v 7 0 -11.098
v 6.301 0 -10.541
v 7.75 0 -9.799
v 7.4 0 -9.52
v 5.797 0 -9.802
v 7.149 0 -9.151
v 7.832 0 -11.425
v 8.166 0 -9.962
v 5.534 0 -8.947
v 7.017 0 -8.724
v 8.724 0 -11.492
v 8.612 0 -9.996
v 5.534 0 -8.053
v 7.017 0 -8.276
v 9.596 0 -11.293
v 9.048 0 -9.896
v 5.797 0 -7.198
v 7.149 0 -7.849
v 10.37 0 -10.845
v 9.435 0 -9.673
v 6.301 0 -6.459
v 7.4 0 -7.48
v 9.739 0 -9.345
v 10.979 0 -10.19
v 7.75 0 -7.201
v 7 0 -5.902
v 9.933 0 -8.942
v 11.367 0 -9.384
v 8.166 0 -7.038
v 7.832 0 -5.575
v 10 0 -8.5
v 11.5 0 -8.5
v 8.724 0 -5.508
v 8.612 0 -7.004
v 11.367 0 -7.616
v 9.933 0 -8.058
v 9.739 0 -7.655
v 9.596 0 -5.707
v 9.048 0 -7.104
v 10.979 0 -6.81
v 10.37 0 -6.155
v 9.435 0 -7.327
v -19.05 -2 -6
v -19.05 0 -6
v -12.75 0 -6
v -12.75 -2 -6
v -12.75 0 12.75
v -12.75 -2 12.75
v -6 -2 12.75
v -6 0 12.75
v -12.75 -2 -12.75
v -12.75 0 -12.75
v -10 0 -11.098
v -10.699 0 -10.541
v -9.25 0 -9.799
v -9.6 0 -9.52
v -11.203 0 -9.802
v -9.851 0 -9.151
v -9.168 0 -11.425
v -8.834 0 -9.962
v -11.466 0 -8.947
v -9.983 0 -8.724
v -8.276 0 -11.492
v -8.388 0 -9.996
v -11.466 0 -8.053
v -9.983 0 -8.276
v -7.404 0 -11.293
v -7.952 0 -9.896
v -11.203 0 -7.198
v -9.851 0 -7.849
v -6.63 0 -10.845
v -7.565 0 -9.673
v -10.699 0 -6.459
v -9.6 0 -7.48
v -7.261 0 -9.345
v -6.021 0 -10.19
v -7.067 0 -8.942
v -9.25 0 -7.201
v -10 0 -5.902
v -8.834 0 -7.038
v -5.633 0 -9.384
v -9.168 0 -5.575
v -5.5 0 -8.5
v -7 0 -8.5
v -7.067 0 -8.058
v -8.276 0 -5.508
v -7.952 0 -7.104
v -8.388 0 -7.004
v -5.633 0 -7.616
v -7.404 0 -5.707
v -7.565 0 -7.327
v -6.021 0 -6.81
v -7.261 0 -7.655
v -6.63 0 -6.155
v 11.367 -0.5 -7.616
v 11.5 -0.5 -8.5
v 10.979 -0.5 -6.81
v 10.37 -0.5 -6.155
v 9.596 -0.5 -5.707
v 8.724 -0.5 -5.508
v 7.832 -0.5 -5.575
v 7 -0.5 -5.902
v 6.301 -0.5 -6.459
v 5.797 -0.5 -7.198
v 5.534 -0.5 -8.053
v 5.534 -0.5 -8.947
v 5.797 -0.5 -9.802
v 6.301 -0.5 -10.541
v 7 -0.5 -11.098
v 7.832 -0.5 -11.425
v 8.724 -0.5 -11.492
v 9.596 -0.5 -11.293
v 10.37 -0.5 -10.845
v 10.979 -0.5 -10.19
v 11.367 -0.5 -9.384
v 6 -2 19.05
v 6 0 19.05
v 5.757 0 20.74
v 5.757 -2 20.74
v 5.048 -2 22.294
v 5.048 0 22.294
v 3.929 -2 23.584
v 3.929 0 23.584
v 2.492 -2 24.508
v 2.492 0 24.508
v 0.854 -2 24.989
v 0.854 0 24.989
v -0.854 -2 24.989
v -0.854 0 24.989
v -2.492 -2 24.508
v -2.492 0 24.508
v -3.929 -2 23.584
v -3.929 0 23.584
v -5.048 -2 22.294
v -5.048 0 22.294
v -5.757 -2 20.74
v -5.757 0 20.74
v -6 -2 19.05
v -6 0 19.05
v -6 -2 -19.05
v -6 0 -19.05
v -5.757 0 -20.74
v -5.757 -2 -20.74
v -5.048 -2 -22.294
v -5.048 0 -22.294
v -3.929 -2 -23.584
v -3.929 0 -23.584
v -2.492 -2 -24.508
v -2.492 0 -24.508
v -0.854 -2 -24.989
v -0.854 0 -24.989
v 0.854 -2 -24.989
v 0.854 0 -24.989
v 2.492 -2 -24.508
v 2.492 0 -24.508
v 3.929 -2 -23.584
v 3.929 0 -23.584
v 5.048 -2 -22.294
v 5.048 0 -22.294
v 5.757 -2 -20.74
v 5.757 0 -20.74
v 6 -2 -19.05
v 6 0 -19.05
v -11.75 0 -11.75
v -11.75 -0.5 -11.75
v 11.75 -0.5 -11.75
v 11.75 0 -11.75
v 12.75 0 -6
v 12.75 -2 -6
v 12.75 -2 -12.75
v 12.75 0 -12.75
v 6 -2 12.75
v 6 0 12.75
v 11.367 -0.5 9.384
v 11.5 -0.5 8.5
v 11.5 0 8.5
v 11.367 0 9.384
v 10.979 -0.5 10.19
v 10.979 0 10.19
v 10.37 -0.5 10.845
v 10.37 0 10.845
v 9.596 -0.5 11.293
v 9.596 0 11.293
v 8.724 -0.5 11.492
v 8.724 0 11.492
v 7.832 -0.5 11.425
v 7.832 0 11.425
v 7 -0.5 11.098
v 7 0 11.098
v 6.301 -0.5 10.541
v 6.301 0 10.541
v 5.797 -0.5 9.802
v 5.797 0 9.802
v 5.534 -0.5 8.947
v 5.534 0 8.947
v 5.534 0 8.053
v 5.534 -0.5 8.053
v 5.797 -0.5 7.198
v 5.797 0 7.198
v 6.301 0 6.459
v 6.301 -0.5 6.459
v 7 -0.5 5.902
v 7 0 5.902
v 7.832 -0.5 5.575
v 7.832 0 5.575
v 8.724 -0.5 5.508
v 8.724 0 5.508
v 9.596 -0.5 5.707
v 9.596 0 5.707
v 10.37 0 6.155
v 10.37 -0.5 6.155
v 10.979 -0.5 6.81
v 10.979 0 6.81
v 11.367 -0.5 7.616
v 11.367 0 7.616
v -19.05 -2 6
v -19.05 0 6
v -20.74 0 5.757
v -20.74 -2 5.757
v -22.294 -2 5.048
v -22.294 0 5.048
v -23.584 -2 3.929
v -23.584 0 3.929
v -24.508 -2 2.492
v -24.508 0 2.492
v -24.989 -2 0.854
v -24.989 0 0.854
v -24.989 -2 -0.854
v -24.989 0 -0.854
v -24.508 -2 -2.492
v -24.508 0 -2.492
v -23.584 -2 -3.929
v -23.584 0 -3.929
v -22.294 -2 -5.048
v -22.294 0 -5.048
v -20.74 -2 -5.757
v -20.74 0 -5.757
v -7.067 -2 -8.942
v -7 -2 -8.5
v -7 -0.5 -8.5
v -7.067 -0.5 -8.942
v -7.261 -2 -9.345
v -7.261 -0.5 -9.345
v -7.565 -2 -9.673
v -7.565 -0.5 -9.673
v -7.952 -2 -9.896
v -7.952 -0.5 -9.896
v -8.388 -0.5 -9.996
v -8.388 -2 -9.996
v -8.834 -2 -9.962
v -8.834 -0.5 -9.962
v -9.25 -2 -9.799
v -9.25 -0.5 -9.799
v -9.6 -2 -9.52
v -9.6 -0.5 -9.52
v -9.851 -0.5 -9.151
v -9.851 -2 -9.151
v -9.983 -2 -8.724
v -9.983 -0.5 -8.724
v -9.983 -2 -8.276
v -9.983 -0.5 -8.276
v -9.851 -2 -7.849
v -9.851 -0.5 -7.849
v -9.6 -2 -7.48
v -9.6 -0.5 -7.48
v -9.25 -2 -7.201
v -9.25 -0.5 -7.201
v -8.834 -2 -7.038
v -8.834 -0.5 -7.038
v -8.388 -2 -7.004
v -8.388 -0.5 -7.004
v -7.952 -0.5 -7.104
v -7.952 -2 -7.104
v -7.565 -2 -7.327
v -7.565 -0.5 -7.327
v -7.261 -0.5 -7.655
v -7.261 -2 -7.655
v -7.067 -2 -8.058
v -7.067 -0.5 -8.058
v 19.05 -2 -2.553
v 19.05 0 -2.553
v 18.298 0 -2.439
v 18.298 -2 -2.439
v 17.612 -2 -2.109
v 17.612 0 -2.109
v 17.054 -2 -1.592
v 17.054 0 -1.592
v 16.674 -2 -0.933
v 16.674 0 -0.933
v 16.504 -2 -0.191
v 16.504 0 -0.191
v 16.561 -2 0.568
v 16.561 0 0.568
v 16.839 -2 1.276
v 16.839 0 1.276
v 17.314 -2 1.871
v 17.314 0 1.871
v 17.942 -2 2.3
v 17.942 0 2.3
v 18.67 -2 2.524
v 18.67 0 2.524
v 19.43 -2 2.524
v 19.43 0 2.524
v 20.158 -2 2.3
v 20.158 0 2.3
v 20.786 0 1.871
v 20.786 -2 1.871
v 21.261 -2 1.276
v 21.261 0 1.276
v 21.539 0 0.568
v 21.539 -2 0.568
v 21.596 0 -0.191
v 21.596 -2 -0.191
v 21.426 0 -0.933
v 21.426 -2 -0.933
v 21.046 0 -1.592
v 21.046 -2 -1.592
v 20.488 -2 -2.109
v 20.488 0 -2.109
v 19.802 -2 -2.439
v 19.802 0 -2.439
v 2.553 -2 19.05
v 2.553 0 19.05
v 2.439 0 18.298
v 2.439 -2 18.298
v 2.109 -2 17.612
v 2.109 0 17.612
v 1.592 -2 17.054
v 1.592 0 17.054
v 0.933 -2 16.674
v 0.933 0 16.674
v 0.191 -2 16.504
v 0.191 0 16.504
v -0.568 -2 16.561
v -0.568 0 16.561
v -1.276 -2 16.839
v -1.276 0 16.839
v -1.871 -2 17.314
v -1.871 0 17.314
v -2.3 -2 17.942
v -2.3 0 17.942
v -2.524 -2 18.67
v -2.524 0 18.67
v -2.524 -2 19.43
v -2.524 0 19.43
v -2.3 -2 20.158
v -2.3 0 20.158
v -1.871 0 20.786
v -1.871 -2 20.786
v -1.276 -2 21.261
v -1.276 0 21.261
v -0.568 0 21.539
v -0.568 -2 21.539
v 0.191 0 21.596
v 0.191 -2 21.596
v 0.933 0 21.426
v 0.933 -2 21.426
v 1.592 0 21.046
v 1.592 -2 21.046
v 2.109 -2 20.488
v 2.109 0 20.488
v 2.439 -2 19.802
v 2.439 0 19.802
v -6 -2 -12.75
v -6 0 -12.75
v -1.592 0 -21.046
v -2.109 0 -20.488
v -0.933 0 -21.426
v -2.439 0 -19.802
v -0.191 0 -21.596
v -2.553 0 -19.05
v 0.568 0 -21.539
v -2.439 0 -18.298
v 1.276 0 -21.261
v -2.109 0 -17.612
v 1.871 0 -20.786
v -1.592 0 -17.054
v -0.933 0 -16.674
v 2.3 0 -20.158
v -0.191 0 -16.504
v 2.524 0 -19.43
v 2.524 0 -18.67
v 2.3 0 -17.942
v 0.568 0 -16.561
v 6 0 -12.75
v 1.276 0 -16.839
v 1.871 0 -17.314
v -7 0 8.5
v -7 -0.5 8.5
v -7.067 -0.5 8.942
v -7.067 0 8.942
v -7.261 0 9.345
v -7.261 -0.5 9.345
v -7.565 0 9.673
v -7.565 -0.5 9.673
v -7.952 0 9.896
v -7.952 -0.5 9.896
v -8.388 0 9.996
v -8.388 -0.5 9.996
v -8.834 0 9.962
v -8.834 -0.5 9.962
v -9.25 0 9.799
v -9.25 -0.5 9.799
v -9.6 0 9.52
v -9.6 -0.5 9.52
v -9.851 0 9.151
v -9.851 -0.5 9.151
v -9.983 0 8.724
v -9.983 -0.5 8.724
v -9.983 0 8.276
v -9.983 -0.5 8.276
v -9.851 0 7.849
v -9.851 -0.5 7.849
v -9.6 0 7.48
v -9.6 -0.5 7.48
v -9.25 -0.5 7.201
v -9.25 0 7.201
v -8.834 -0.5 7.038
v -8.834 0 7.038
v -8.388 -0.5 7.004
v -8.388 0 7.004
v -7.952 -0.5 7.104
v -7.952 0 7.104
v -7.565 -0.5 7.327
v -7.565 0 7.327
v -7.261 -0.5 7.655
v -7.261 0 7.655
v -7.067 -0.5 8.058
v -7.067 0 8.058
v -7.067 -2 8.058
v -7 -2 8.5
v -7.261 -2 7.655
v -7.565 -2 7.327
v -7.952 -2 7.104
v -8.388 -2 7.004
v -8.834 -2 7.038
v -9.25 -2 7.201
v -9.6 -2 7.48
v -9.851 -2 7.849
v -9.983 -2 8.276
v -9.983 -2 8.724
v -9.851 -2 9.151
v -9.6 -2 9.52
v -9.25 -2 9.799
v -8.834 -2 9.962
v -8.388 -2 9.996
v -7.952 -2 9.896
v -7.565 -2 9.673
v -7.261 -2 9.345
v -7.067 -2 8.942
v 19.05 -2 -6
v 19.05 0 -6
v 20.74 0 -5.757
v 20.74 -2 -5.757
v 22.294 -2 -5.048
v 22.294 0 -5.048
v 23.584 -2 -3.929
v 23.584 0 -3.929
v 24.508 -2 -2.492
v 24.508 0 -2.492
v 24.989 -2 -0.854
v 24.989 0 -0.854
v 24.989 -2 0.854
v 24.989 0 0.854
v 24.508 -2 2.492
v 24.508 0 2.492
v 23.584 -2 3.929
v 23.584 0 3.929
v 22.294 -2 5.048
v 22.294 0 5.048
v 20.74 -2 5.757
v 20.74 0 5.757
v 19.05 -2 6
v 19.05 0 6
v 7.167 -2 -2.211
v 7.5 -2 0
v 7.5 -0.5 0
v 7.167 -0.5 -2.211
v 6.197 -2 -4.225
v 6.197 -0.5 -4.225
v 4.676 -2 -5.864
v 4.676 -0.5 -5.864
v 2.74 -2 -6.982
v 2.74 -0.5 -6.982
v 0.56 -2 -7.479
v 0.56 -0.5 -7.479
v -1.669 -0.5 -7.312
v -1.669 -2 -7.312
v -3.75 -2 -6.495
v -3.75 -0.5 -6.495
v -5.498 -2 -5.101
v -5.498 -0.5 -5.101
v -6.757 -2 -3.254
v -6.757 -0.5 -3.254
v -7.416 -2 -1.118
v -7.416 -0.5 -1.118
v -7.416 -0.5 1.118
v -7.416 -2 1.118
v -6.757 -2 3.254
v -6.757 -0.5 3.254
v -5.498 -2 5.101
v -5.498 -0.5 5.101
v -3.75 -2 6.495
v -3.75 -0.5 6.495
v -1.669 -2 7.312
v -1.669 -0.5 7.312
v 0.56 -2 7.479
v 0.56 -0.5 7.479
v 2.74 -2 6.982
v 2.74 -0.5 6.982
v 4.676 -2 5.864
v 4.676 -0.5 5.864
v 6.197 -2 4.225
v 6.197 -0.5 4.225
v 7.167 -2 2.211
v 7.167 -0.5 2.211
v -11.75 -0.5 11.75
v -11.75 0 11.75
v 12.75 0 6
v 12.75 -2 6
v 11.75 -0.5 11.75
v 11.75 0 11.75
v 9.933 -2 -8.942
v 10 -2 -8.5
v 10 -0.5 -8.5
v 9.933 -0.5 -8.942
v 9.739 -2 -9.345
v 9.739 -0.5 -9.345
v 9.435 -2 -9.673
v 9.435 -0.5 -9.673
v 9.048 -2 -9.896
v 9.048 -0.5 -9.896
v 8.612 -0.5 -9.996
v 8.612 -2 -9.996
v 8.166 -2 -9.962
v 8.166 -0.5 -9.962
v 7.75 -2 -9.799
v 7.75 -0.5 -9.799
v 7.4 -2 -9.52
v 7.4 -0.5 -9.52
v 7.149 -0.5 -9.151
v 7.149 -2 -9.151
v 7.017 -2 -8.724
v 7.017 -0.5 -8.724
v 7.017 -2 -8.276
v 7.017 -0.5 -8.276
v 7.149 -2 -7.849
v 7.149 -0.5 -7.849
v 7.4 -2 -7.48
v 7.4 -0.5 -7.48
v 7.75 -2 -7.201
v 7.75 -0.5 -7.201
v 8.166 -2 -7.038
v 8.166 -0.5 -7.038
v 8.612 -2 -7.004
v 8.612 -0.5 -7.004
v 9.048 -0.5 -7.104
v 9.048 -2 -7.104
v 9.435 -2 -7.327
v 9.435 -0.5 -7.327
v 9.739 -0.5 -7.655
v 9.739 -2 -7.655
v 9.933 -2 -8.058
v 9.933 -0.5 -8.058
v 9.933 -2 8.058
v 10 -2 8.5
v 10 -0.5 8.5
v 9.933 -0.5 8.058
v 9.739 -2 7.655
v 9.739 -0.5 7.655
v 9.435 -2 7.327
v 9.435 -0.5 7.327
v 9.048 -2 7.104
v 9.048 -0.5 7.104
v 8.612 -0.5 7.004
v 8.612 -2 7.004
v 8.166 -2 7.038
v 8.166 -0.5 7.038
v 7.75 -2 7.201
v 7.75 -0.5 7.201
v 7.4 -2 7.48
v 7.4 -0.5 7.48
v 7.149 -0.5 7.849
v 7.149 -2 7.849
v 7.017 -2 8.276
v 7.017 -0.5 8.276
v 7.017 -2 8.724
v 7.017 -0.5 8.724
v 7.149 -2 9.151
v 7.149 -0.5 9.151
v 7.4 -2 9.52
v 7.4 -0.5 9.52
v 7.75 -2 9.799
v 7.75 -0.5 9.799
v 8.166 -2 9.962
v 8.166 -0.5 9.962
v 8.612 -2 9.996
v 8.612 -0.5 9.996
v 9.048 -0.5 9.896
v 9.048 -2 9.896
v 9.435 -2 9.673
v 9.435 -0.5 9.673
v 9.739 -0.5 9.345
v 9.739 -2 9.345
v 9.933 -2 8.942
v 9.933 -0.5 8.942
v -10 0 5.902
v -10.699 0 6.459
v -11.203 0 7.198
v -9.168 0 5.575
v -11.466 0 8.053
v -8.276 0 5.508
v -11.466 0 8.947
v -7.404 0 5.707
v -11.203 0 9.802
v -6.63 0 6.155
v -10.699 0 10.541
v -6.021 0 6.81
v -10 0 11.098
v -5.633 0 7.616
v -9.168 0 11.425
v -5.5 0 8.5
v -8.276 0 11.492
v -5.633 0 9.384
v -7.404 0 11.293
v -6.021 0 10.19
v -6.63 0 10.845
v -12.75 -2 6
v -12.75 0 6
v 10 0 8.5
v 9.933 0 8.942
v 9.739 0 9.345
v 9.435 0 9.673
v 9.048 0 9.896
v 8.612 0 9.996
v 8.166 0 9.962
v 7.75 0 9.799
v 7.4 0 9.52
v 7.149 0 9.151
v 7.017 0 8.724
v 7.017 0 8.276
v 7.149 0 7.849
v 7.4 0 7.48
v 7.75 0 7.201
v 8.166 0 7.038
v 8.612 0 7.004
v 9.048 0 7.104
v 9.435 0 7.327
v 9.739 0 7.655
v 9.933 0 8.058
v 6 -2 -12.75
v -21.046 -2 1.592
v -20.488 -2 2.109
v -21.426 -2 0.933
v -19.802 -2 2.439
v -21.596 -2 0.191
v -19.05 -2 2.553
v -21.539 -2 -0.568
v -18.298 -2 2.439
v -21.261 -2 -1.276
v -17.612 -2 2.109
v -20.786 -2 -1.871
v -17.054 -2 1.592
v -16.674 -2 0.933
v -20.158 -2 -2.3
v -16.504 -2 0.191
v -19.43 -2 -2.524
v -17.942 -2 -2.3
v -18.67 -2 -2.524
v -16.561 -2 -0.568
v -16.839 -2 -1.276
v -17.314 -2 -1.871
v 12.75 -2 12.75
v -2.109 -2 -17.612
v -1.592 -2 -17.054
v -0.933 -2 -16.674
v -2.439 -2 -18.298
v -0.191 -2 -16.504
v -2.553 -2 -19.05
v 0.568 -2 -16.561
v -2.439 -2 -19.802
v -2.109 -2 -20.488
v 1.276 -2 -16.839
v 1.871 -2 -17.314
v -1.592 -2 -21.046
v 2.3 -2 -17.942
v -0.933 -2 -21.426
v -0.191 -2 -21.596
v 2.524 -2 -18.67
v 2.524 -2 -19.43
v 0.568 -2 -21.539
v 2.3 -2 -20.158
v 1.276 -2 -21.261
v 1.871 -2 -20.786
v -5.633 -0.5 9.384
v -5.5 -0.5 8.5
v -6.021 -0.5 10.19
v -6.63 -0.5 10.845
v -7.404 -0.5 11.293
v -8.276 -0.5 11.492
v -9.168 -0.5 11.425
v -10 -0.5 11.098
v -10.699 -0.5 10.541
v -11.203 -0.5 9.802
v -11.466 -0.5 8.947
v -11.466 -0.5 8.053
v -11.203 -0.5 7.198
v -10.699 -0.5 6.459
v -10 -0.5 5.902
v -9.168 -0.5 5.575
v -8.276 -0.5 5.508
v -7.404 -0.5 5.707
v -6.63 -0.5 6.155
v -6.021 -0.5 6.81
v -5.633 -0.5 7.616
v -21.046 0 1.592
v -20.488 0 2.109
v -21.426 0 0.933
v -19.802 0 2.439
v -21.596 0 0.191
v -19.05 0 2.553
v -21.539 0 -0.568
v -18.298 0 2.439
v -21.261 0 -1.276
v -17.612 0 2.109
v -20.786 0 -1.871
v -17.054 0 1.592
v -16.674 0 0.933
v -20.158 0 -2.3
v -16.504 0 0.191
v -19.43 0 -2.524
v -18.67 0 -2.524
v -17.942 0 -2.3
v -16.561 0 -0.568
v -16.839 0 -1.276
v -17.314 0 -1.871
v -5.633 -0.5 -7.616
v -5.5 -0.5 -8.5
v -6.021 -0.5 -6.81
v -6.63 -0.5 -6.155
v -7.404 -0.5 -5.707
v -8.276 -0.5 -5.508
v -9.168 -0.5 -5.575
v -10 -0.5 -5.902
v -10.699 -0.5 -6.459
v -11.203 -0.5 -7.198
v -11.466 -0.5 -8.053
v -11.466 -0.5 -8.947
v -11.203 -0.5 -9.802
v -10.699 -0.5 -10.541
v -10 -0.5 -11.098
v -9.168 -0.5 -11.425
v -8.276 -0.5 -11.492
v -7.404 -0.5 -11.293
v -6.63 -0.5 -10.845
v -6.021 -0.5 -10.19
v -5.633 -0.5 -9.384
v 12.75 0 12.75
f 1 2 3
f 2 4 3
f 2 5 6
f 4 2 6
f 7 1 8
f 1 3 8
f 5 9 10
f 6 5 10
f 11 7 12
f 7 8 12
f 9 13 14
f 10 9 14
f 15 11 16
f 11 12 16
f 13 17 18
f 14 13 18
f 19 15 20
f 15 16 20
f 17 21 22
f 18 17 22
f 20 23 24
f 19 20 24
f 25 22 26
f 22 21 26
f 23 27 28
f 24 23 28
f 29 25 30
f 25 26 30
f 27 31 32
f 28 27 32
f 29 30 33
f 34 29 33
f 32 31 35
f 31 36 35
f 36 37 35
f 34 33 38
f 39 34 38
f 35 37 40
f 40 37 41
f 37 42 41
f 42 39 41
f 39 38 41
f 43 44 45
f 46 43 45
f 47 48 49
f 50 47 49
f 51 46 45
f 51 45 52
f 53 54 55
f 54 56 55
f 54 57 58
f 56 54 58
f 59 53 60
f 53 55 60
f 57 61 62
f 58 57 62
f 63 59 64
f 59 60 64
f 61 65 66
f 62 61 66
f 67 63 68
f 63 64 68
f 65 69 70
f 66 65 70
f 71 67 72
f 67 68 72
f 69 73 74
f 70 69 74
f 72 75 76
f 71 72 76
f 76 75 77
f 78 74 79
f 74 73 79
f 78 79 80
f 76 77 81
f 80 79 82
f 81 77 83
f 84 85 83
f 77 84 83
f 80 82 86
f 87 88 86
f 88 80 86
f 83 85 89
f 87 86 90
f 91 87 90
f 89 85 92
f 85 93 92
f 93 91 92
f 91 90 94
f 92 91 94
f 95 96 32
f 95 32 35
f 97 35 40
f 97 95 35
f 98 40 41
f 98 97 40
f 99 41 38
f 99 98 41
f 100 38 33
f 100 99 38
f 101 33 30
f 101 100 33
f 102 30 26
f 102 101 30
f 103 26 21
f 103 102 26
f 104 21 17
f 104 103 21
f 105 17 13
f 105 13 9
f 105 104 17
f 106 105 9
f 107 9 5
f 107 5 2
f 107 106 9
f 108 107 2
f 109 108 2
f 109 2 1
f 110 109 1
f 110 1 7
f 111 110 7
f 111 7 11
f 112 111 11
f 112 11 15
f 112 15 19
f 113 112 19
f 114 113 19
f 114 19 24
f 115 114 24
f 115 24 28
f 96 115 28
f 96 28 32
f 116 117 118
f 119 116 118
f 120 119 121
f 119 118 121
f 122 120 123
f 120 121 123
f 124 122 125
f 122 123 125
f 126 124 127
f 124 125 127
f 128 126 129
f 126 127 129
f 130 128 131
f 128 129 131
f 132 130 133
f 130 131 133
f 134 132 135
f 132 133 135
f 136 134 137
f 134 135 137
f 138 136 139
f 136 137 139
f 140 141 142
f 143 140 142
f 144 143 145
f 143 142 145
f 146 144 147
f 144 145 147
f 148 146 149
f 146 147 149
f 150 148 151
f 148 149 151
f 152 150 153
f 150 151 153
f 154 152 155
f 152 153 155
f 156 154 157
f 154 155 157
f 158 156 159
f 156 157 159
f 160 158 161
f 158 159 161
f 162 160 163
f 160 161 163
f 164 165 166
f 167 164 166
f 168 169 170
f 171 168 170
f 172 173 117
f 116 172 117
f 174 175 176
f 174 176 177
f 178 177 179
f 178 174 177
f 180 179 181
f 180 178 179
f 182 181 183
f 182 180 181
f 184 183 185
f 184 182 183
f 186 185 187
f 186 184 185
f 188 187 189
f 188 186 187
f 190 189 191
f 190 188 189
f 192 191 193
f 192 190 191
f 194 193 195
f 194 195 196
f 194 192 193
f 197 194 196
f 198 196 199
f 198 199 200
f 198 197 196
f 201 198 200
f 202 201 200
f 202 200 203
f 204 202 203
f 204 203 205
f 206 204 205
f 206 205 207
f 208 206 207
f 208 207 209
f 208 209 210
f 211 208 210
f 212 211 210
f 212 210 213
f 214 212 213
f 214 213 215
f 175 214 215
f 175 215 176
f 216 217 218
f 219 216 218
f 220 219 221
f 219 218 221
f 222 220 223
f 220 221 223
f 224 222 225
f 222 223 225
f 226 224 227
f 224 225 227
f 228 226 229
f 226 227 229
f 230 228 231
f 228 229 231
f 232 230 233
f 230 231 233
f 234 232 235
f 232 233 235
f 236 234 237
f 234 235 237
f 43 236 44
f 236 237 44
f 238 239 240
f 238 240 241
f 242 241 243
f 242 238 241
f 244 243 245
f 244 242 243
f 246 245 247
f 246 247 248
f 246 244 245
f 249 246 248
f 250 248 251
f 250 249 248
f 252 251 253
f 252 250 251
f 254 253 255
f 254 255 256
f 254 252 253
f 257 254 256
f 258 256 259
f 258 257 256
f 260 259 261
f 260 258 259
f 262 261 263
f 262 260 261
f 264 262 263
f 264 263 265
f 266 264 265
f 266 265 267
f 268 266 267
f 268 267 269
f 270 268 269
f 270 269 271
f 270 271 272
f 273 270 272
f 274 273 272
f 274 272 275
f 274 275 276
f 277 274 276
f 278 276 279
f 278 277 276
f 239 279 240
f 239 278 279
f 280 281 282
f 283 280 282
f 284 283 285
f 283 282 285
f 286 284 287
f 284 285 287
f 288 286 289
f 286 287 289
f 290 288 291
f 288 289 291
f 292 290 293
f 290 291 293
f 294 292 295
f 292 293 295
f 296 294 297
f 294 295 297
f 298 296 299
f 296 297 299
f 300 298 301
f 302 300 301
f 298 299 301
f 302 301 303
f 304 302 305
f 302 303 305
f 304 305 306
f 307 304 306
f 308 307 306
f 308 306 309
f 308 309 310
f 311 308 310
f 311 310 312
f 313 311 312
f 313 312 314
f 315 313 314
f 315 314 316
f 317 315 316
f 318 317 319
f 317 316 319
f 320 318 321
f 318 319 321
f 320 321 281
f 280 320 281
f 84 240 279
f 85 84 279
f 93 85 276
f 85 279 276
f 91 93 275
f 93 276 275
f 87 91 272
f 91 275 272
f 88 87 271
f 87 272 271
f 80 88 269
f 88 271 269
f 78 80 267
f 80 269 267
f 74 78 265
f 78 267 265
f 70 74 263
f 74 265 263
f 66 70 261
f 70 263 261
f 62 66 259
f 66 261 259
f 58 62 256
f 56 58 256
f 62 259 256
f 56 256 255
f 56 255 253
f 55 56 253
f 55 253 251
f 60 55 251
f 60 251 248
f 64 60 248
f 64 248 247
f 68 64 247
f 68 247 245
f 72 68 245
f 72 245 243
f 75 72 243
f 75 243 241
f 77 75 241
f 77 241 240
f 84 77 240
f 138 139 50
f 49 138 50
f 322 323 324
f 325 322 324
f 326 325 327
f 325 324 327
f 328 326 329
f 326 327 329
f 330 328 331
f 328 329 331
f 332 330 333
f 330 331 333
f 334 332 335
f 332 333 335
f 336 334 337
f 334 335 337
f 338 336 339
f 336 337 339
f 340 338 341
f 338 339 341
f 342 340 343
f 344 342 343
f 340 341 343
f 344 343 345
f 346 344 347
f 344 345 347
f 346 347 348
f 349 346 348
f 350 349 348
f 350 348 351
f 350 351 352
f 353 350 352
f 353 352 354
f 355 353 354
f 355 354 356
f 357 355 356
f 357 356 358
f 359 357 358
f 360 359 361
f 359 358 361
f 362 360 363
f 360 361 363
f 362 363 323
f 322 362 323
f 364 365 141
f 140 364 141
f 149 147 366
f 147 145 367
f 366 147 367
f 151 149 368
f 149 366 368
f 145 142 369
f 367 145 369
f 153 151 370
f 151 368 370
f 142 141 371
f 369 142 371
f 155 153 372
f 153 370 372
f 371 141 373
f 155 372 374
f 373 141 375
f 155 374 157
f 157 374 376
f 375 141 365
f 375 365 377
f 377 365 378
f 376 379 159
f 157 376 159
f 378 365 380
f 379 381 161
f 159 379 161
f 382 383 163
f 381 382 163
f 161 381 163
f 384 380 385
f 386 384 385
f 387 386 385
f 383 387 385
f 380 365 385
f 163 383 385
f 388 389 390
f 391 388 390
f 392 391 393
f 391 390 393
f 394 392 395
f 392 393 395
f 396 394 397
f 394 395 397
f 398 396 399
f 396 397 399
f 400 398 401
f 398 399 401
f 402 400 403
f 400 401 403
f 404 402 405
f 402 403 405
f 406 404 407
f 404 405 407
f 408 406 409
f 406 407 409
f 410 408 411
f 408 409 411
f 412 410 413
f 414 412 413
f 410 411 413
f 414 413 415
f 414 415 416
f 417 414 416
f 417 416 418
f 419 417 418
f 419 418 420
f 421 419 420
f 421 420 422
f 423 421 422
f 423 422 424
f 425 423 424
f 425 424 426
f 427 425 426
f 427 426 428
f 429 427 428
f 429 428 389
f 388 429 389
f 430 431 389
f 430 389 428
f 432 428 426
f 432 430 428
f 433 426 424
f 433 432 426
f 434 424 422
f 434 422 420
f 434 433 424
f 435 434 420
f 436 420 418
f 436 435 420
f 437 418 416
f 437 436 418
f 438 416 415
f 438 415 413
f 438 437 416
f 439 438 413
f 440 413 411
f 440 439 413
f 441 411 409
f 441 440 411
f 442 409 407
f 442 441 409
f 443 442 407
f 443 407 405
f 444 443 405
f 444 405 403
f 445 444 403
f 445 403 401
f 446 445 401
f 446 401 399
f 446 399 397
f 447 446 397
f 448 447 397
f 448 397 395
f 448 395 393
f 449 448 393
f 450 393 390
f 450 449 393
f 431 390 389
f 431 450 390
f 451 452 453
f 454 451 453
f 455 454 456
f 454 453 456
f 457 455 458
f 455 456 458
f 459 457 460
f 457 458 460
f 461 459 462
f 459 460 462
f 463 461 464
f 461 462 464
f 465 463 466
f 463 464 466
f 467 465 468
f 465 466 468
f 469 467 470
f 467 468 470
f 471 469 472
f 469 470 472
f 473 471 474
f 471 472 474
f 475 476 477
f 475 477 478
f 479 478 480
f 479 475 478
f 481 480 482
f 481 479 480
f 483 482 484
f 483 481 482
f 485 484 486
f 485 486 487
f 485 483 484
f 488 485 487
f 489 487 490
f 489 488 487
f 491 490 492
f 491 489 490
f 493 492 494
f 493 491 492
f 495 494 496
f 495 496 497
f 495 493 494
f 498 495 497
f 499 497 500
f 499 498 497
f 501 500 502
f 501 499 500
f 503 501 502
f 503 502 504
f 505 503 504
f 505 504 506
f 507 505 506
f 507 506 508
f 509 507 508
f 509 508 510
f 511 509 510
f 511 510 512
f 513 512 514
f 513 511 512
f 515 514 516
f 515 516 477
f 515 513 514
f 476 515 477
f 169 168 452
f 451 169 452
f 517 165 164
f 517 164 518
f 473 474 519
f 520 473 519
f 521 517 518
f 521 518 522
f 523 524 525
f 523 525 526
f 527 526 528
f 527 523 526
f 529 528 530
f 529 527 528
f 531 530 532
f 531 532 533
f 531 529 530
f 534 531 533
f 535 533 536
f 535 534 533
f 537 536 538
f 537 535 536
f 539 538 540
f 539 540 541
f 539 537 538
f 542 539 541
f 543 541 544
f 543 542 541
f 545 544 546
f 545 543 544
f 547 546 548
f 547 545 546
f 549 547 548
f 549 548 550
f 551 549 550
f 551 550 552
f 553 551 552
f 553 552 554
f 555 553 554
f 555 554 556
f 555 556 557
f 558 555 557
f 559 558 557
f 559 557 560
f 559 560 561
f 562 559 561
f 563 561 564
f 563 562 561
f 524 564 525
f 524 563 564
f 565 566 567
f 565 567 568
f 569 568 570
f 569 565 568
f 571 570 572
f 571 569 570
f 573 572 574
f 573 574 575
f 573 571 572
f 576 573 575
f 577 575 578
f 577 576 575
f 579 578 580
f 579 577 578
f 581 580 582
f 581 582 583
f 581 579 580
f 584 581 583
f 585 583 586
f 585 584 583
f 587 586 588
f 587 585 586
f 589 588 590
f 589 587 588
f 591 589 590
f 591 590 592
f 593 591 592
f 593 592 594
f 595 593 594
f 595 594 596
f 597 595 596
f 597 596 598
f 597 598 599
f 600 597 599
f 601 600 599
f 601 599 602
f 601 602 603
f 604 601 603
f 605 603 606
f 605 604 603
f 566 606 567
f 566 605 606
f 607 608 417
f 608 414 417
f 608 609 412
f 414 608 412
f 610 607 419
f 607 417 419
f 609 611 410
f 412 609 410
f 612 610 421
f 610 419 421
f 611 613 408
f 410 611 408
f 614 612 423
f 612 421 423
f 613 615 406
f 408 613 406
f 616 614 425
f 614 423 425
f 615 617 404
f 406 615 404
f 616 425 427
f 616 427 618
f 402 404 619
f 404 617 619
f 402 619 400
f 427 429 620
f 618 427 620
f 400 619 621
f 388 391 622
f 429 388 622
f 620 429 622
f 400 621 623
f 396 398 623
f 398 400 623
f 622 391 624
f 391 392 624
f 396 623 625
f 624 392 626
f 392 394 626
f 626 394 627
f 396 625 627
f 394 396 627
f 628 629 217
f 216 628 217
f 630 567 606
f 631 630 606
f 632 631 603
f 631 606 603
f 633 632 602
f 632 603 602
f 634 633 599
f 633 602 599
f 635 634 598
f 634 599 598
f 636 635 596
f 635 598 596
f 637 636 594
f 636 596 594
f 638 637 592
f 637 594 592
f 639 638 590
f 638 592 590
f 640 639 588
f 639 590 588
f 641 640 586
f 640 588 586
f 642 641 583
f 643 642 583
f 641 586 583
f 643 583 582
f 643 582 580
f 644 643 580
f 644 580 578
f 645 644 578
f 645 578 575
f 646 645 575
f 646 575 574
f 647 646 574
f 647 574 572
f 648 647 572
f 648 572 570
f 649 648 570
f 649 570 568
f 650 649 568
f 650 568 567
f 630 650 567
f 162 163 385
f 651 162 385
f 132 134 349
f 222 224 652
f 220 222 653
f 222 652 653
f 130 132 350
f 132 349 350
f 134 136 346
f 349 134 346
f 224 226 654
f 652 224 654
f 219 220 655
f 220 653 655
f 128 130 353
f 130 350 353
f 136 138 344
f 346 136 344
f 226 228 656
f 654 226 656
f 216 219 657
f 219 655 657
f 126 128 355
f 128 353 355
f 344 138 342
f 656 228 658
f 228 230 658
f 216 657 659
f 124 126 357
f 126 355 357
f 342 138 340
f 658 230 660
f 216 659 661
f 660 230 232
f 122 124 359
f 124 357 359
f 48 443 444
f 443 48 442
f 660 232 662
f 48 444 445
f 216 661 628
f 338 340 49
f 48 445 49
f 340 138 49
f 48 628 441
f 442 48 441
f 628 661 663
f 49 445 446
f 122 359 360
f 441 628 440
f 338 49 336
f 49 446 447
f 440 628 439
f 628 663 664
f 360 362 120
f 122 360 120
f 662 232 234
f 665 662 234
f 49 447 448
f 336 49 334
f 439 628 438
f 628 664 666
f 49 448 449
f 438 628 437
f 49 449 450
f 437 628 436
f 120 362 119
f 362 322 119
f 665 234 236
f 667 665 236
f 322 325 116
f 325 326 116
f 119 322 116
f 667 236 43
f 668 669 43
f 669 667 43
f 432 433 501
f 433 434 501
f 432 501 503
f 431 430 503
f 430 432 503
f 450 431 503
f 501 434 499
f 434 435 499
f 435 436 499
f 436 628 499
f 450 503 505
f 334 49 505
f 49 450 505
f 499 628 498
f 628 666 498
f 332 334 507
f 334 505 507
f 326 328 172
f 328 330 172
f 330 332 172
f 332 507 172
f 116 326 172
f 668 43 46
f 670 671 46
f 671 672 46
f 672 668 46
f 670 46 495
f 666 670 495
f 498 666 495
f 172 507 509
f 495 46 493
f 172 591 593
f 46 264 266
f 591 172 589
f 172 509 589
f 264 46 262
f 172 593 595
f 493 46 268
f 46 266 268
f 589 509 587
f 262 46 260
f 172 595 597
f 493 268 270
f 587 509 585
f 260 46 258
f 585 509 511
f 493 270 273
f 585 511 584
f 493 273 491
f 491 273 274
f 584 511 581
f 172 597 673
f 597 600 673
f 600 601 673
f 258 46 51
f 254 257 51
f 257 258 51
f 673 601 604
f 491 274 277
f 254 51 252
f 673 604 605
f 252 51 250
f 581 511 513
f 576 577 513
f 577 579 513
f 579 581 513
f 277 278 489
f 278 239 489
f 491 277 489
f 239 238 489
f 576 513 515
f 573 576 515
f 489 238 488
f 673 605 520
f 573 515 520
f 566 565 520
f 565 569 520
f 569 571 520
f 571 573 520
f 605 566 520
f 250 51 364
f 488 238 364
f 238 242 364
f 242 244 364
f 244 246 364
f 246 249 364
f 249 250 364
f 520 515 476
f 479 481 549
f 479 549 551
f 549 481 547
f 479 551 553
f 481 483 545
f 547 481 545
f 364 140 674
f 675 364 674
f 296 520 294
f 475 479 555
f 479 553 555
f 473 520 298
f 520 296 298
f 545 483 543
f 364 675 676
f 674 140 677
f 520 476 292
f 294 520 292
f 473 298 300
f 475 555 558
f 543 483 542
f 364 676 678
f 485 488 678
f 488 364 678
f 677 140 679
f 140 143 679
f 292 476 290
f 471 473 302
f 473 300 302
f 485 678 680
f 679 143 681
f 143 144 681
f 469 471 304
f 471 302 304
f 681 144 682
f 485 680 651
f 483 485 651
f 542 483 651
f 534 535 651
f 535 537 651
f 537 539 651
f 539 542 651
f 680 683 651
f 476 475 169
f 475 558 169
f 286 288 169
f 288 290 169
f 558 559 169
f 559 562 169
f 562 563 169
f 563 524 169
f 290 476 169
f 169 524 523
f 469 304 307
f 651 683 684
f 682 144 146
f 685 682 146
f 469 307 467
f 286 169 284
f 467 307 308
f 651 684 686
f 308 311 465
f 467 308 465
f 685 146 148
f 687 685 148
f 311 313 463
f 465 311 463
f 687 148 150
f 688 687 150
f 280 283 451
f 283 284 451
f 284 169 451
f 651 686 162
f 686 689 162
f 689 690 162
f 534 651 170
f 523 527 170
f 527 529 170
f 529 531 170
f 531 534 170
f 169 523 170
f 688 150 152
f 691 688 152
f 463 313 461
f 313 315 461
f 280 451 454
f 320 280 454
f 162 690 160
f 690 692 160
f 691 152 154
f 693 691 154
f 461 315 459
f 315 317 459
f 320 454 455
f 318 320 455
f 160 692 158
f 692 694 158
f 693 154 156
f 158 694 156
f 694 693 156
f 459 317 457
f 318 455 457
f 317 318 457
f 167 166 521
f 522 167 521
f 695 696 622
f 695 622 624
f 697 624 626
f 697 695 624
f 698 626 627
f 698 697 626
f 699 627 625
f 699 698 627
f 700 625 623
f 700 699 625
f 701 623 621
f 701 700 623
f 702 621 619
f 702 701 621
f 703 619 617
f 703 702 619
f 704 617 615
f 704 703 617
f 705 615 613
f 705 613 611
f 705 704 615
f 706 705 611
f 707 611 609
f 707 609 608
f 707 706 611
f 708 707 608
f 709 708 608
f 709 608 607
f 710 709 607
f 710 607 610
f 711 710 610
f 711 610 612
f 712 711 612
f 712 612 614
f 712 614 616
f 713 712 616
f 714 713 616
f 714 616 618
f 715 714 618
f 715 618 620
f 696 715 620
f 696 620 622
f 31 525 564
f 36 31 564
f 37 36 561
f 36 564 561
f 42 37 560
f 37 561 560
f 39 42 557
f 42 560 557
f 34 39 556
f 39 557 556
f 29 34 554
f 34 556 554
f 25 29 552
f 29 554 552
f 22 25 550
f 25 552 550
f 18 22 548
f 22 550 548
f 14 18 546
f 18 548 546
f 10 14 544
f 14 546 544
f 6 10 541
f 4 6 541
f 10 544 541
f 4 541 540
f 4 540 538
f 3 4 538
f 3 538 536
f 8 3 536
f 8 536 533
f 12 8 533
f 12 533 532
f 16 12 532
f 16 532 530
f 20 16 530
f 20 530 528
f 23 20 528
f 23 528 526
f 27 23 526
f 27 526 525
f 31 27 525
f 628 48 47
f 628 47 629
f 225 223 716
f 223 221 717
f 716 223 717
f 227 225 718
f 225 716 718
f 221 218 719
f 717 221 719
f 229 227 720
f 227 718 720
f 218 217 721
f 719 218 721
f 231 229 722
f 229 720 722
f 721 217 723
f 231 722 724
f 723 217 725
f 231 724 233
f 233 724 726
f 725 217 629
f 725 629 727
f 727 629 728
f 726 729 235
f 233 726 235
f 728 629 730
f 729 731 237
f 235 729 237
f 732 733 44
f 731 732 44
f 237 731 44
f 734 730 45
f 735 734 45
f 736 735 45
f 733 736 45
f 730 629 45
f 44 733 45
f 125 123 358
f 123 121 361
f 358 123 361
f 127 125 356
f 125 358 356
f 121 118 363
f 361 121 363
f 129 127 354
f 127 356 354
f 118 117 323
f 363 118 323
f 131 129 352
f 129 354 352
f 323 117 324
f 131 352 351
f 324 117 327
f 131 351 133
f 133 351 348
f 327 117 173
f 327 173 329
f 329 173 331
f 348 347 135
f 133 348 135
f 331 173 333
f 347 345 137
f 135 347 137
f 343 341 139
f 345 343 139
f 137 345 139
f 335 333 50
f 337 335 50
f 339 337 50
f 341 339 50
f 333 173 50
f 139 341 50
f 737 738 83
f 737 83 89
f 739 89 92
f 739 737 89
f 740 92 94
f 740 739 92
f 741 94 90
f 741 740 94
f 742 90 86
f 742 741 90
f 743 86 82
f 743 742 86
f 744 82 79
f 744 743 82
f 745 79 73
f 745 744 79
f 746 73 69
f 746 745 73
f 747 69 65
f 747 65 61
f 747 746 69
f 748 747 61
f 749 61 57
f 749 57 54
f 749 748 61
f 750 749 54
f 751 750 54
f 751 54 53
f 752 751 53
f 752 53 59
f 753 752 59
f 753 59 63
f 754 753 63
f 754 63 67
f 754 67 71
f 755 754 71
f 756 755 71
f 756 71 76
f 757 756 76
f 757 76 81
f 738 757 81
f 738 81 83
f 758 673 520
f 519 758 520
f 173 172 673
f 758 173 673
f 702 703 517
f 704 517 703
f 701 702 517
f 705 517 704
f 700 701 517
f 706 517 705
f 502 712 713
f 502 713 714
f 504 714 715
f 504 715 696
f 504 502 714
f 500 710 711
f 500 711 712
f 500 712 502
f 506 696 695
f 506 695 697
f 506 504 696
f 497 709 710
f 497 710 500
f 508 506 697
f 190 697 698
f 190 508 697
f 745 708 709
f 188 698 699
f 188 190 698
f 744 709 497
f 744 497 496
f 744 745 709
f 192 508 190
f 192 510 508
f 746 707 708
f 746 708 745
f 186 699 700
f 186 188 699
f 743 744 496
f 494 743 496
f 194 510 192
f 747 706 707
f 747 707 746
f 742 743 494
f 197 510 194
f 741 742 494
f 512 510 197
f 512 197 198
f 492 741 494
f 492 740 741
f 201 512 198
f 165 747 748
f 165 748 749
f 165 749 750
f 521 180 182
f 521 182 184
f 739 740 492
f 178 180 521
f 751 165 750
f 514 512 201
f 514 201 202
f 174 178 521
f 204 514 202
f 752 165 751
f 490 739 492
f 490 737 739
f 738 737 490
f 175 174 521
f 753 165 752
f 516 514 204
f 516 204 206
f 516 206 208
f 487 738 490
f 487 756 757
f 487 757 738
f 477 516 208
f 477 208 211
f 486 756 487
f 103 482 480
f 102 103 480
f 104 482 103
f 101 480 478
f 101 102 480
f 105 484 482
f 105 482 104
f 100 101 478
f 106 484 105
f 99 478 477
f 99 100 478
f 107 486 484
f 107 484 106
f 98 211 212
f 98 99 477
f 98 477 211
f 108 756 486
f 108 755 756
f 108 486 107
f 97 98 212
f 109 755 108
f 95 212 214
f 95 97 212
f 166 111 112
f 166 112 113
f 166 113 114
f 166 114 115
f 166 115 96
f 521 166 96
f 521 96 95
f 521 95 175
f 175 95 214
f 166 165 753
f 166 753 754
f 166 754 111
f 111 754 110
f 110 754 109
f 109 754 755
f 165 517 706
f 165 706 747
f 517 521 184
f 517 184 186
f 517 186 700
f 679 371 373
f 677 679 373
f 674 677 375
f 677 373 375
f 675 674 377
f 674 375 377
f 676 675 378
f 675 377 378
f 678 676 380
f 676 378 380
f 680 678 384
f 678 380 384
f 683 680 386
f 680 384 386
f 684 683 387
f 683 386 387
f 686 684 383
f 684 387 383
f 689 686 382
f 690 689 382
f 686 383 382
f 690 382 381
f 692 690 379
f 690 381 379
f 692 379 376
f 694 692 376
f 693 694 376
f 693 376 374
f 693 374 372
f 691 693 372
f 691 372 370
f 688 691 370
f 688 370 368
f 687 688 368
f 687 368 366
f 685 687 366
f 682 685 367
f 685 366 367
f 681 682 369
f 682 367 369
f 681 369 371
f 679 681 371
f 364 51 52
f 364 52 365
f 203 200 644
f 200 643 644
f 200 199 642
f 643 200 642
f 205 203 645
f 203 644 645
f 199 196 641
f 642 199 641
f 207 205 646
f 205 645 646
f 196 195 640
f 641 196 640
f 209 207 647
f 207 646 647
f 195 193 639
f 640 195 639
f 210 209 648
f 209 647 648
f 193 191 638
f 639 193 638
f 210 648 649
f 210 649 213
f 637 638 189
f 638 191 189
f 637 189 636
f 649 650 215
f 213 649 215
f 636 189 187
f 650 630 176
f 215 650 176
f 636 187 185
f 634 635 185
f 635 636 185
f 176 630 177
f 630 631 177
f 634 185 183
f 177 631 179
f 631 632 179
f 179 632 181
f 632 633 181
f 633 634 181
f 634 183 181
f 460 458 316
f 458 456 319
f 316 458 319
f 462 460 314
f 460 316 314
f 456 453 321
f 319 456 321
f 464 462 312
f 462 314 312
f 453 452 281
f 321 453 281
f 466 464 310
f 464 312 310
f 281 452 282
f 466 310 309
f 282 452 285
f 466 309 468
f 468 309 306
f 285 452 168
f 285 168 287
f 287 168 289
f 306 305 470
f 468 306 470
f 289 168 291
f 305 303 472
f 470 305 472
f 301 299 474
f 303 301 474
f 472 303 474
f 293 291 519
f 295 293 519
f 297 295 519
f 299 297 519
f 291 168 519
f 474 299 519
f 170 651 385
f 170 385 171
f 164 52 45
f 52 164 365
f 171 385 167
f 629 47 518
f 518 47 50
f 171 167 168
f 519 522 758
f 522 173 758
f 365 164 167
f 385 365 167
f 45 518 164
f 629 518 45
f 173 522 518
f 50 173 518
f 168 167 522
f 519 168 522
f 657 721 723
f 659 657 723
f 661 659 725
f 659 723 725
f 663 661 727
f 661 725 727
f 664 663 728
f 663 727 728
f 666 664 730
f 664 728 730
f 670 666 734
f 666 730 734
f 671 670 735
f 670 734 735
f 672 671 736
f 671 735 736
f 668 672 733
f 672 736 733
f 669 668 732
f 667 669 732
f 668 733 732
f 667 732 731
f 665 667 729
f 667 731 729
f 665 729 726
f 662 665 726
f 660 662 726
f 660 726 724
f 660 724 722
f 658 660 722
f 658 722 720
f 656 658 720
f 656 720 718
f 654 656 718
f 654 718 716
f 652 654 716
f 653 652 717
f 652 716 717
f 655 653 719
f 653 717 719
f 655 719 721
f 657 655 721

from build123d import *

# Parameters (mm, degrees)
SKETCH1_W           = 23
SKETCH1_H           = 23
SKETCH1_R           = 1.5
BOSS_EXTRUDE1_DEPTH = 1
SKETCH2_W           = 6
SKETCH2_H           = 5
BOSS_EXTRUDE2_DEPTH = 1
FILLET1_R           = 3
BOSS_EXTRUDE3_START = -3
SKETCH3_W           = 25.5
SKETCH3_H           = 25.5
SKETCH3_R           = 1.5
SKETCH3_R_2         = 7.5
BOSS_EXTRUDE3_DEPTH = 1.5
SKETCH4_R           = 3
SKETCH4_R_2         = 1.5
BOSS_EXTRUDE4_DEPTH = 2
SKETCH5_W           = 25.5
SKETCH5_H           = 25.5
SKETCH5_W_2         = 23.5
SKETCH5_H_2         = 23.5
BOSS_EXTRUDE5_DEPTH = 2
SKETCH6_R           = 2.5527
BOSS_EXTRUDE6_DEPTH = 2
CIRPATTERN1_COUNT   = 4


with BuildPart() as part:
    # Sketch1 → Boss-Extrude1 (new body)
    with BuildSketch(Plane(origin=(0, 0, 0), x_dir=(1, 0, 0), z_dir=(0, 1, 0))):
        Rectangle(SKETCH1_W, SKETCH1_H)
        with Locations((-8.5, 8.5)):
            Circle(SKETCH1_R, mode=Mode.SUBTRACT)
        with Locations((8.5, 8.5)):
            Circle(SKETCH1_R, mode=Mode.SUBTRACT)
        with Locations((8.5, -8.5)):
            Circle(SKETCH1_R, mode=Mode.SUBTRACT)
        with Locations((-8.5, -8.5)):
            Circle(SKETCH1_R, mode=Mode.SUBTRACT)
    extrude(amount=BOSS_EXTRUDE1_DEPTH)

    # Sketch2 → Boss-Extrude2 (add)
    with BuildSketch(Plane(origin=(0, 1, 0), x_dir=(1, 0, 0), z_dir=(0, 1, 0))):
        Rectangle(SKETCH2_W, SKETCH2_H)
    extrude(amount=BOSS_EXTRUDE2_DEPTH)

    # Fillet1
    fillet1_edges = [part.edges().sort_by_distance(p)[0] for p in [
        (11.5, 0.5, 11.5),
        (-11.5, 0.5, 11.5),
        (-11.5, 0.5, -11.5),
        (11.5, 0.5, -11.5),
    ]]
    fillet(fillet1_edges, radius=FILLET1_R)


with BuildPart() as body_2:
    # Sketch3 → Boss-Extrude3 (new body)
    with BuildSketch(Plane(origin=(0, 1, 0), x_dir=(1, 0, 0), z_dir=(0, 1, 0)).offset(BOSS_EXTRUDE3_START)):
        Rectangle(SKETCH3_W, SKETCH3_H)
        with Locations((-8.5, 8.5)):
            Circle(SKETCH3_R, mode=Mode.SUBTRACT)
        with Locations((8.5, 8.5)):
            Circle(SKETCH3_R, mode=Mode.SUBTRACT)
        with Locations((8.5, -8.5)):
            Circle(SKETCH3_R, mode=Mode.SUBTRACT)
        with Locations((-8.5, -8.5)):
            Circle(SKETCH3_R, mode=Mode.SUBTRACT)
        Circle(SKETCH3_R_2, mode=Mode.SUBTRACT)
    extrude(amount=BOSS_EXTRUDE3_DEPTH)

    # Sketch4 → Boss-Extrude4 (add)
    with BuildSketch(Plane.XZ.offset(2)):
        with Locations((-8.5, 8.5)):
            Circle(SKETCH4_R)
        with Locations((-8.5, 8.5)):
            Circle(SKETCH4_R_2, mode=Mode.SUBTRACT)
        with Locations((8.5, 8.5)):
            Circle(SKETCH4_R)
        with Locations((8.5, 8.5)):
            Circle(SKETCH4_R_2, mode=Mode.SUBTRACT)
        with Locations((8.5, -8.5)):
            Circle(SKETCH4_R)
        with Locations((8.5, -8.5)):
            Circle(SKETCH4_R_2, mode=Mode.SUBTRACT)
        with Locations((-8.5, -8.5)):
            Circle(SKETCH4_R)
        with Locations((-8.5, -8.5)):
            Circle(SKETCH4_R_2, mode=Mode.SUBTRACT)
    extrude(amount=-BOSS_EXTRUDE4_DEPTH)

    # Sketch5 → Boss-Extrude5 (add)
    with BuildSketch(Plane.XZ.offset(2)):
        Rectangle(SKETCH5_W, SKETCH5_H)
        Rectangle(SKETCH5_W_2, SKETCH5_H_2, mode=Mode.SUBTRACT)
    extrude(amount=-BOSS_EXTRUDE5_DEPTH)

    # Sketch6 → Boss-Extrude6 (add)
    with BuildSketch(Plane(origin=(0, 0, 0), x_dir=(-1, 0, 0), z_dir=(0, 1, 0))):
        with BuildLine():
            Line((-6, -19.05), (-6, -12.75))
            Line((-6, -12.75), (6, -12.75))
            Line((6, -12.75), (6, -19.05))
            ThreePointArc((6, -19.05), (0, -25.05), (-6, -19.05))
        make_face()
        with Locations((0, -19.05)):
            Circle(SKETCH6_R, mode=Mode.SUBTRACT)
    boss_extrude6 = extrude(amount=-BOSS_EXTRUDE6_DEPTH)

    # CirPattern1: Boss-Extrude6 ×4 about axis
    cirpattern1_axis = Axis((0, 0, 0), (0, 1, 0))
    for i in range(1, CIRPATTERN1_COUNT):
        add(boss_extrude6.rotate(cirpattern1_axis, i * 360 / CIRPATTERN1_COUNT))


solid = body_2.part
